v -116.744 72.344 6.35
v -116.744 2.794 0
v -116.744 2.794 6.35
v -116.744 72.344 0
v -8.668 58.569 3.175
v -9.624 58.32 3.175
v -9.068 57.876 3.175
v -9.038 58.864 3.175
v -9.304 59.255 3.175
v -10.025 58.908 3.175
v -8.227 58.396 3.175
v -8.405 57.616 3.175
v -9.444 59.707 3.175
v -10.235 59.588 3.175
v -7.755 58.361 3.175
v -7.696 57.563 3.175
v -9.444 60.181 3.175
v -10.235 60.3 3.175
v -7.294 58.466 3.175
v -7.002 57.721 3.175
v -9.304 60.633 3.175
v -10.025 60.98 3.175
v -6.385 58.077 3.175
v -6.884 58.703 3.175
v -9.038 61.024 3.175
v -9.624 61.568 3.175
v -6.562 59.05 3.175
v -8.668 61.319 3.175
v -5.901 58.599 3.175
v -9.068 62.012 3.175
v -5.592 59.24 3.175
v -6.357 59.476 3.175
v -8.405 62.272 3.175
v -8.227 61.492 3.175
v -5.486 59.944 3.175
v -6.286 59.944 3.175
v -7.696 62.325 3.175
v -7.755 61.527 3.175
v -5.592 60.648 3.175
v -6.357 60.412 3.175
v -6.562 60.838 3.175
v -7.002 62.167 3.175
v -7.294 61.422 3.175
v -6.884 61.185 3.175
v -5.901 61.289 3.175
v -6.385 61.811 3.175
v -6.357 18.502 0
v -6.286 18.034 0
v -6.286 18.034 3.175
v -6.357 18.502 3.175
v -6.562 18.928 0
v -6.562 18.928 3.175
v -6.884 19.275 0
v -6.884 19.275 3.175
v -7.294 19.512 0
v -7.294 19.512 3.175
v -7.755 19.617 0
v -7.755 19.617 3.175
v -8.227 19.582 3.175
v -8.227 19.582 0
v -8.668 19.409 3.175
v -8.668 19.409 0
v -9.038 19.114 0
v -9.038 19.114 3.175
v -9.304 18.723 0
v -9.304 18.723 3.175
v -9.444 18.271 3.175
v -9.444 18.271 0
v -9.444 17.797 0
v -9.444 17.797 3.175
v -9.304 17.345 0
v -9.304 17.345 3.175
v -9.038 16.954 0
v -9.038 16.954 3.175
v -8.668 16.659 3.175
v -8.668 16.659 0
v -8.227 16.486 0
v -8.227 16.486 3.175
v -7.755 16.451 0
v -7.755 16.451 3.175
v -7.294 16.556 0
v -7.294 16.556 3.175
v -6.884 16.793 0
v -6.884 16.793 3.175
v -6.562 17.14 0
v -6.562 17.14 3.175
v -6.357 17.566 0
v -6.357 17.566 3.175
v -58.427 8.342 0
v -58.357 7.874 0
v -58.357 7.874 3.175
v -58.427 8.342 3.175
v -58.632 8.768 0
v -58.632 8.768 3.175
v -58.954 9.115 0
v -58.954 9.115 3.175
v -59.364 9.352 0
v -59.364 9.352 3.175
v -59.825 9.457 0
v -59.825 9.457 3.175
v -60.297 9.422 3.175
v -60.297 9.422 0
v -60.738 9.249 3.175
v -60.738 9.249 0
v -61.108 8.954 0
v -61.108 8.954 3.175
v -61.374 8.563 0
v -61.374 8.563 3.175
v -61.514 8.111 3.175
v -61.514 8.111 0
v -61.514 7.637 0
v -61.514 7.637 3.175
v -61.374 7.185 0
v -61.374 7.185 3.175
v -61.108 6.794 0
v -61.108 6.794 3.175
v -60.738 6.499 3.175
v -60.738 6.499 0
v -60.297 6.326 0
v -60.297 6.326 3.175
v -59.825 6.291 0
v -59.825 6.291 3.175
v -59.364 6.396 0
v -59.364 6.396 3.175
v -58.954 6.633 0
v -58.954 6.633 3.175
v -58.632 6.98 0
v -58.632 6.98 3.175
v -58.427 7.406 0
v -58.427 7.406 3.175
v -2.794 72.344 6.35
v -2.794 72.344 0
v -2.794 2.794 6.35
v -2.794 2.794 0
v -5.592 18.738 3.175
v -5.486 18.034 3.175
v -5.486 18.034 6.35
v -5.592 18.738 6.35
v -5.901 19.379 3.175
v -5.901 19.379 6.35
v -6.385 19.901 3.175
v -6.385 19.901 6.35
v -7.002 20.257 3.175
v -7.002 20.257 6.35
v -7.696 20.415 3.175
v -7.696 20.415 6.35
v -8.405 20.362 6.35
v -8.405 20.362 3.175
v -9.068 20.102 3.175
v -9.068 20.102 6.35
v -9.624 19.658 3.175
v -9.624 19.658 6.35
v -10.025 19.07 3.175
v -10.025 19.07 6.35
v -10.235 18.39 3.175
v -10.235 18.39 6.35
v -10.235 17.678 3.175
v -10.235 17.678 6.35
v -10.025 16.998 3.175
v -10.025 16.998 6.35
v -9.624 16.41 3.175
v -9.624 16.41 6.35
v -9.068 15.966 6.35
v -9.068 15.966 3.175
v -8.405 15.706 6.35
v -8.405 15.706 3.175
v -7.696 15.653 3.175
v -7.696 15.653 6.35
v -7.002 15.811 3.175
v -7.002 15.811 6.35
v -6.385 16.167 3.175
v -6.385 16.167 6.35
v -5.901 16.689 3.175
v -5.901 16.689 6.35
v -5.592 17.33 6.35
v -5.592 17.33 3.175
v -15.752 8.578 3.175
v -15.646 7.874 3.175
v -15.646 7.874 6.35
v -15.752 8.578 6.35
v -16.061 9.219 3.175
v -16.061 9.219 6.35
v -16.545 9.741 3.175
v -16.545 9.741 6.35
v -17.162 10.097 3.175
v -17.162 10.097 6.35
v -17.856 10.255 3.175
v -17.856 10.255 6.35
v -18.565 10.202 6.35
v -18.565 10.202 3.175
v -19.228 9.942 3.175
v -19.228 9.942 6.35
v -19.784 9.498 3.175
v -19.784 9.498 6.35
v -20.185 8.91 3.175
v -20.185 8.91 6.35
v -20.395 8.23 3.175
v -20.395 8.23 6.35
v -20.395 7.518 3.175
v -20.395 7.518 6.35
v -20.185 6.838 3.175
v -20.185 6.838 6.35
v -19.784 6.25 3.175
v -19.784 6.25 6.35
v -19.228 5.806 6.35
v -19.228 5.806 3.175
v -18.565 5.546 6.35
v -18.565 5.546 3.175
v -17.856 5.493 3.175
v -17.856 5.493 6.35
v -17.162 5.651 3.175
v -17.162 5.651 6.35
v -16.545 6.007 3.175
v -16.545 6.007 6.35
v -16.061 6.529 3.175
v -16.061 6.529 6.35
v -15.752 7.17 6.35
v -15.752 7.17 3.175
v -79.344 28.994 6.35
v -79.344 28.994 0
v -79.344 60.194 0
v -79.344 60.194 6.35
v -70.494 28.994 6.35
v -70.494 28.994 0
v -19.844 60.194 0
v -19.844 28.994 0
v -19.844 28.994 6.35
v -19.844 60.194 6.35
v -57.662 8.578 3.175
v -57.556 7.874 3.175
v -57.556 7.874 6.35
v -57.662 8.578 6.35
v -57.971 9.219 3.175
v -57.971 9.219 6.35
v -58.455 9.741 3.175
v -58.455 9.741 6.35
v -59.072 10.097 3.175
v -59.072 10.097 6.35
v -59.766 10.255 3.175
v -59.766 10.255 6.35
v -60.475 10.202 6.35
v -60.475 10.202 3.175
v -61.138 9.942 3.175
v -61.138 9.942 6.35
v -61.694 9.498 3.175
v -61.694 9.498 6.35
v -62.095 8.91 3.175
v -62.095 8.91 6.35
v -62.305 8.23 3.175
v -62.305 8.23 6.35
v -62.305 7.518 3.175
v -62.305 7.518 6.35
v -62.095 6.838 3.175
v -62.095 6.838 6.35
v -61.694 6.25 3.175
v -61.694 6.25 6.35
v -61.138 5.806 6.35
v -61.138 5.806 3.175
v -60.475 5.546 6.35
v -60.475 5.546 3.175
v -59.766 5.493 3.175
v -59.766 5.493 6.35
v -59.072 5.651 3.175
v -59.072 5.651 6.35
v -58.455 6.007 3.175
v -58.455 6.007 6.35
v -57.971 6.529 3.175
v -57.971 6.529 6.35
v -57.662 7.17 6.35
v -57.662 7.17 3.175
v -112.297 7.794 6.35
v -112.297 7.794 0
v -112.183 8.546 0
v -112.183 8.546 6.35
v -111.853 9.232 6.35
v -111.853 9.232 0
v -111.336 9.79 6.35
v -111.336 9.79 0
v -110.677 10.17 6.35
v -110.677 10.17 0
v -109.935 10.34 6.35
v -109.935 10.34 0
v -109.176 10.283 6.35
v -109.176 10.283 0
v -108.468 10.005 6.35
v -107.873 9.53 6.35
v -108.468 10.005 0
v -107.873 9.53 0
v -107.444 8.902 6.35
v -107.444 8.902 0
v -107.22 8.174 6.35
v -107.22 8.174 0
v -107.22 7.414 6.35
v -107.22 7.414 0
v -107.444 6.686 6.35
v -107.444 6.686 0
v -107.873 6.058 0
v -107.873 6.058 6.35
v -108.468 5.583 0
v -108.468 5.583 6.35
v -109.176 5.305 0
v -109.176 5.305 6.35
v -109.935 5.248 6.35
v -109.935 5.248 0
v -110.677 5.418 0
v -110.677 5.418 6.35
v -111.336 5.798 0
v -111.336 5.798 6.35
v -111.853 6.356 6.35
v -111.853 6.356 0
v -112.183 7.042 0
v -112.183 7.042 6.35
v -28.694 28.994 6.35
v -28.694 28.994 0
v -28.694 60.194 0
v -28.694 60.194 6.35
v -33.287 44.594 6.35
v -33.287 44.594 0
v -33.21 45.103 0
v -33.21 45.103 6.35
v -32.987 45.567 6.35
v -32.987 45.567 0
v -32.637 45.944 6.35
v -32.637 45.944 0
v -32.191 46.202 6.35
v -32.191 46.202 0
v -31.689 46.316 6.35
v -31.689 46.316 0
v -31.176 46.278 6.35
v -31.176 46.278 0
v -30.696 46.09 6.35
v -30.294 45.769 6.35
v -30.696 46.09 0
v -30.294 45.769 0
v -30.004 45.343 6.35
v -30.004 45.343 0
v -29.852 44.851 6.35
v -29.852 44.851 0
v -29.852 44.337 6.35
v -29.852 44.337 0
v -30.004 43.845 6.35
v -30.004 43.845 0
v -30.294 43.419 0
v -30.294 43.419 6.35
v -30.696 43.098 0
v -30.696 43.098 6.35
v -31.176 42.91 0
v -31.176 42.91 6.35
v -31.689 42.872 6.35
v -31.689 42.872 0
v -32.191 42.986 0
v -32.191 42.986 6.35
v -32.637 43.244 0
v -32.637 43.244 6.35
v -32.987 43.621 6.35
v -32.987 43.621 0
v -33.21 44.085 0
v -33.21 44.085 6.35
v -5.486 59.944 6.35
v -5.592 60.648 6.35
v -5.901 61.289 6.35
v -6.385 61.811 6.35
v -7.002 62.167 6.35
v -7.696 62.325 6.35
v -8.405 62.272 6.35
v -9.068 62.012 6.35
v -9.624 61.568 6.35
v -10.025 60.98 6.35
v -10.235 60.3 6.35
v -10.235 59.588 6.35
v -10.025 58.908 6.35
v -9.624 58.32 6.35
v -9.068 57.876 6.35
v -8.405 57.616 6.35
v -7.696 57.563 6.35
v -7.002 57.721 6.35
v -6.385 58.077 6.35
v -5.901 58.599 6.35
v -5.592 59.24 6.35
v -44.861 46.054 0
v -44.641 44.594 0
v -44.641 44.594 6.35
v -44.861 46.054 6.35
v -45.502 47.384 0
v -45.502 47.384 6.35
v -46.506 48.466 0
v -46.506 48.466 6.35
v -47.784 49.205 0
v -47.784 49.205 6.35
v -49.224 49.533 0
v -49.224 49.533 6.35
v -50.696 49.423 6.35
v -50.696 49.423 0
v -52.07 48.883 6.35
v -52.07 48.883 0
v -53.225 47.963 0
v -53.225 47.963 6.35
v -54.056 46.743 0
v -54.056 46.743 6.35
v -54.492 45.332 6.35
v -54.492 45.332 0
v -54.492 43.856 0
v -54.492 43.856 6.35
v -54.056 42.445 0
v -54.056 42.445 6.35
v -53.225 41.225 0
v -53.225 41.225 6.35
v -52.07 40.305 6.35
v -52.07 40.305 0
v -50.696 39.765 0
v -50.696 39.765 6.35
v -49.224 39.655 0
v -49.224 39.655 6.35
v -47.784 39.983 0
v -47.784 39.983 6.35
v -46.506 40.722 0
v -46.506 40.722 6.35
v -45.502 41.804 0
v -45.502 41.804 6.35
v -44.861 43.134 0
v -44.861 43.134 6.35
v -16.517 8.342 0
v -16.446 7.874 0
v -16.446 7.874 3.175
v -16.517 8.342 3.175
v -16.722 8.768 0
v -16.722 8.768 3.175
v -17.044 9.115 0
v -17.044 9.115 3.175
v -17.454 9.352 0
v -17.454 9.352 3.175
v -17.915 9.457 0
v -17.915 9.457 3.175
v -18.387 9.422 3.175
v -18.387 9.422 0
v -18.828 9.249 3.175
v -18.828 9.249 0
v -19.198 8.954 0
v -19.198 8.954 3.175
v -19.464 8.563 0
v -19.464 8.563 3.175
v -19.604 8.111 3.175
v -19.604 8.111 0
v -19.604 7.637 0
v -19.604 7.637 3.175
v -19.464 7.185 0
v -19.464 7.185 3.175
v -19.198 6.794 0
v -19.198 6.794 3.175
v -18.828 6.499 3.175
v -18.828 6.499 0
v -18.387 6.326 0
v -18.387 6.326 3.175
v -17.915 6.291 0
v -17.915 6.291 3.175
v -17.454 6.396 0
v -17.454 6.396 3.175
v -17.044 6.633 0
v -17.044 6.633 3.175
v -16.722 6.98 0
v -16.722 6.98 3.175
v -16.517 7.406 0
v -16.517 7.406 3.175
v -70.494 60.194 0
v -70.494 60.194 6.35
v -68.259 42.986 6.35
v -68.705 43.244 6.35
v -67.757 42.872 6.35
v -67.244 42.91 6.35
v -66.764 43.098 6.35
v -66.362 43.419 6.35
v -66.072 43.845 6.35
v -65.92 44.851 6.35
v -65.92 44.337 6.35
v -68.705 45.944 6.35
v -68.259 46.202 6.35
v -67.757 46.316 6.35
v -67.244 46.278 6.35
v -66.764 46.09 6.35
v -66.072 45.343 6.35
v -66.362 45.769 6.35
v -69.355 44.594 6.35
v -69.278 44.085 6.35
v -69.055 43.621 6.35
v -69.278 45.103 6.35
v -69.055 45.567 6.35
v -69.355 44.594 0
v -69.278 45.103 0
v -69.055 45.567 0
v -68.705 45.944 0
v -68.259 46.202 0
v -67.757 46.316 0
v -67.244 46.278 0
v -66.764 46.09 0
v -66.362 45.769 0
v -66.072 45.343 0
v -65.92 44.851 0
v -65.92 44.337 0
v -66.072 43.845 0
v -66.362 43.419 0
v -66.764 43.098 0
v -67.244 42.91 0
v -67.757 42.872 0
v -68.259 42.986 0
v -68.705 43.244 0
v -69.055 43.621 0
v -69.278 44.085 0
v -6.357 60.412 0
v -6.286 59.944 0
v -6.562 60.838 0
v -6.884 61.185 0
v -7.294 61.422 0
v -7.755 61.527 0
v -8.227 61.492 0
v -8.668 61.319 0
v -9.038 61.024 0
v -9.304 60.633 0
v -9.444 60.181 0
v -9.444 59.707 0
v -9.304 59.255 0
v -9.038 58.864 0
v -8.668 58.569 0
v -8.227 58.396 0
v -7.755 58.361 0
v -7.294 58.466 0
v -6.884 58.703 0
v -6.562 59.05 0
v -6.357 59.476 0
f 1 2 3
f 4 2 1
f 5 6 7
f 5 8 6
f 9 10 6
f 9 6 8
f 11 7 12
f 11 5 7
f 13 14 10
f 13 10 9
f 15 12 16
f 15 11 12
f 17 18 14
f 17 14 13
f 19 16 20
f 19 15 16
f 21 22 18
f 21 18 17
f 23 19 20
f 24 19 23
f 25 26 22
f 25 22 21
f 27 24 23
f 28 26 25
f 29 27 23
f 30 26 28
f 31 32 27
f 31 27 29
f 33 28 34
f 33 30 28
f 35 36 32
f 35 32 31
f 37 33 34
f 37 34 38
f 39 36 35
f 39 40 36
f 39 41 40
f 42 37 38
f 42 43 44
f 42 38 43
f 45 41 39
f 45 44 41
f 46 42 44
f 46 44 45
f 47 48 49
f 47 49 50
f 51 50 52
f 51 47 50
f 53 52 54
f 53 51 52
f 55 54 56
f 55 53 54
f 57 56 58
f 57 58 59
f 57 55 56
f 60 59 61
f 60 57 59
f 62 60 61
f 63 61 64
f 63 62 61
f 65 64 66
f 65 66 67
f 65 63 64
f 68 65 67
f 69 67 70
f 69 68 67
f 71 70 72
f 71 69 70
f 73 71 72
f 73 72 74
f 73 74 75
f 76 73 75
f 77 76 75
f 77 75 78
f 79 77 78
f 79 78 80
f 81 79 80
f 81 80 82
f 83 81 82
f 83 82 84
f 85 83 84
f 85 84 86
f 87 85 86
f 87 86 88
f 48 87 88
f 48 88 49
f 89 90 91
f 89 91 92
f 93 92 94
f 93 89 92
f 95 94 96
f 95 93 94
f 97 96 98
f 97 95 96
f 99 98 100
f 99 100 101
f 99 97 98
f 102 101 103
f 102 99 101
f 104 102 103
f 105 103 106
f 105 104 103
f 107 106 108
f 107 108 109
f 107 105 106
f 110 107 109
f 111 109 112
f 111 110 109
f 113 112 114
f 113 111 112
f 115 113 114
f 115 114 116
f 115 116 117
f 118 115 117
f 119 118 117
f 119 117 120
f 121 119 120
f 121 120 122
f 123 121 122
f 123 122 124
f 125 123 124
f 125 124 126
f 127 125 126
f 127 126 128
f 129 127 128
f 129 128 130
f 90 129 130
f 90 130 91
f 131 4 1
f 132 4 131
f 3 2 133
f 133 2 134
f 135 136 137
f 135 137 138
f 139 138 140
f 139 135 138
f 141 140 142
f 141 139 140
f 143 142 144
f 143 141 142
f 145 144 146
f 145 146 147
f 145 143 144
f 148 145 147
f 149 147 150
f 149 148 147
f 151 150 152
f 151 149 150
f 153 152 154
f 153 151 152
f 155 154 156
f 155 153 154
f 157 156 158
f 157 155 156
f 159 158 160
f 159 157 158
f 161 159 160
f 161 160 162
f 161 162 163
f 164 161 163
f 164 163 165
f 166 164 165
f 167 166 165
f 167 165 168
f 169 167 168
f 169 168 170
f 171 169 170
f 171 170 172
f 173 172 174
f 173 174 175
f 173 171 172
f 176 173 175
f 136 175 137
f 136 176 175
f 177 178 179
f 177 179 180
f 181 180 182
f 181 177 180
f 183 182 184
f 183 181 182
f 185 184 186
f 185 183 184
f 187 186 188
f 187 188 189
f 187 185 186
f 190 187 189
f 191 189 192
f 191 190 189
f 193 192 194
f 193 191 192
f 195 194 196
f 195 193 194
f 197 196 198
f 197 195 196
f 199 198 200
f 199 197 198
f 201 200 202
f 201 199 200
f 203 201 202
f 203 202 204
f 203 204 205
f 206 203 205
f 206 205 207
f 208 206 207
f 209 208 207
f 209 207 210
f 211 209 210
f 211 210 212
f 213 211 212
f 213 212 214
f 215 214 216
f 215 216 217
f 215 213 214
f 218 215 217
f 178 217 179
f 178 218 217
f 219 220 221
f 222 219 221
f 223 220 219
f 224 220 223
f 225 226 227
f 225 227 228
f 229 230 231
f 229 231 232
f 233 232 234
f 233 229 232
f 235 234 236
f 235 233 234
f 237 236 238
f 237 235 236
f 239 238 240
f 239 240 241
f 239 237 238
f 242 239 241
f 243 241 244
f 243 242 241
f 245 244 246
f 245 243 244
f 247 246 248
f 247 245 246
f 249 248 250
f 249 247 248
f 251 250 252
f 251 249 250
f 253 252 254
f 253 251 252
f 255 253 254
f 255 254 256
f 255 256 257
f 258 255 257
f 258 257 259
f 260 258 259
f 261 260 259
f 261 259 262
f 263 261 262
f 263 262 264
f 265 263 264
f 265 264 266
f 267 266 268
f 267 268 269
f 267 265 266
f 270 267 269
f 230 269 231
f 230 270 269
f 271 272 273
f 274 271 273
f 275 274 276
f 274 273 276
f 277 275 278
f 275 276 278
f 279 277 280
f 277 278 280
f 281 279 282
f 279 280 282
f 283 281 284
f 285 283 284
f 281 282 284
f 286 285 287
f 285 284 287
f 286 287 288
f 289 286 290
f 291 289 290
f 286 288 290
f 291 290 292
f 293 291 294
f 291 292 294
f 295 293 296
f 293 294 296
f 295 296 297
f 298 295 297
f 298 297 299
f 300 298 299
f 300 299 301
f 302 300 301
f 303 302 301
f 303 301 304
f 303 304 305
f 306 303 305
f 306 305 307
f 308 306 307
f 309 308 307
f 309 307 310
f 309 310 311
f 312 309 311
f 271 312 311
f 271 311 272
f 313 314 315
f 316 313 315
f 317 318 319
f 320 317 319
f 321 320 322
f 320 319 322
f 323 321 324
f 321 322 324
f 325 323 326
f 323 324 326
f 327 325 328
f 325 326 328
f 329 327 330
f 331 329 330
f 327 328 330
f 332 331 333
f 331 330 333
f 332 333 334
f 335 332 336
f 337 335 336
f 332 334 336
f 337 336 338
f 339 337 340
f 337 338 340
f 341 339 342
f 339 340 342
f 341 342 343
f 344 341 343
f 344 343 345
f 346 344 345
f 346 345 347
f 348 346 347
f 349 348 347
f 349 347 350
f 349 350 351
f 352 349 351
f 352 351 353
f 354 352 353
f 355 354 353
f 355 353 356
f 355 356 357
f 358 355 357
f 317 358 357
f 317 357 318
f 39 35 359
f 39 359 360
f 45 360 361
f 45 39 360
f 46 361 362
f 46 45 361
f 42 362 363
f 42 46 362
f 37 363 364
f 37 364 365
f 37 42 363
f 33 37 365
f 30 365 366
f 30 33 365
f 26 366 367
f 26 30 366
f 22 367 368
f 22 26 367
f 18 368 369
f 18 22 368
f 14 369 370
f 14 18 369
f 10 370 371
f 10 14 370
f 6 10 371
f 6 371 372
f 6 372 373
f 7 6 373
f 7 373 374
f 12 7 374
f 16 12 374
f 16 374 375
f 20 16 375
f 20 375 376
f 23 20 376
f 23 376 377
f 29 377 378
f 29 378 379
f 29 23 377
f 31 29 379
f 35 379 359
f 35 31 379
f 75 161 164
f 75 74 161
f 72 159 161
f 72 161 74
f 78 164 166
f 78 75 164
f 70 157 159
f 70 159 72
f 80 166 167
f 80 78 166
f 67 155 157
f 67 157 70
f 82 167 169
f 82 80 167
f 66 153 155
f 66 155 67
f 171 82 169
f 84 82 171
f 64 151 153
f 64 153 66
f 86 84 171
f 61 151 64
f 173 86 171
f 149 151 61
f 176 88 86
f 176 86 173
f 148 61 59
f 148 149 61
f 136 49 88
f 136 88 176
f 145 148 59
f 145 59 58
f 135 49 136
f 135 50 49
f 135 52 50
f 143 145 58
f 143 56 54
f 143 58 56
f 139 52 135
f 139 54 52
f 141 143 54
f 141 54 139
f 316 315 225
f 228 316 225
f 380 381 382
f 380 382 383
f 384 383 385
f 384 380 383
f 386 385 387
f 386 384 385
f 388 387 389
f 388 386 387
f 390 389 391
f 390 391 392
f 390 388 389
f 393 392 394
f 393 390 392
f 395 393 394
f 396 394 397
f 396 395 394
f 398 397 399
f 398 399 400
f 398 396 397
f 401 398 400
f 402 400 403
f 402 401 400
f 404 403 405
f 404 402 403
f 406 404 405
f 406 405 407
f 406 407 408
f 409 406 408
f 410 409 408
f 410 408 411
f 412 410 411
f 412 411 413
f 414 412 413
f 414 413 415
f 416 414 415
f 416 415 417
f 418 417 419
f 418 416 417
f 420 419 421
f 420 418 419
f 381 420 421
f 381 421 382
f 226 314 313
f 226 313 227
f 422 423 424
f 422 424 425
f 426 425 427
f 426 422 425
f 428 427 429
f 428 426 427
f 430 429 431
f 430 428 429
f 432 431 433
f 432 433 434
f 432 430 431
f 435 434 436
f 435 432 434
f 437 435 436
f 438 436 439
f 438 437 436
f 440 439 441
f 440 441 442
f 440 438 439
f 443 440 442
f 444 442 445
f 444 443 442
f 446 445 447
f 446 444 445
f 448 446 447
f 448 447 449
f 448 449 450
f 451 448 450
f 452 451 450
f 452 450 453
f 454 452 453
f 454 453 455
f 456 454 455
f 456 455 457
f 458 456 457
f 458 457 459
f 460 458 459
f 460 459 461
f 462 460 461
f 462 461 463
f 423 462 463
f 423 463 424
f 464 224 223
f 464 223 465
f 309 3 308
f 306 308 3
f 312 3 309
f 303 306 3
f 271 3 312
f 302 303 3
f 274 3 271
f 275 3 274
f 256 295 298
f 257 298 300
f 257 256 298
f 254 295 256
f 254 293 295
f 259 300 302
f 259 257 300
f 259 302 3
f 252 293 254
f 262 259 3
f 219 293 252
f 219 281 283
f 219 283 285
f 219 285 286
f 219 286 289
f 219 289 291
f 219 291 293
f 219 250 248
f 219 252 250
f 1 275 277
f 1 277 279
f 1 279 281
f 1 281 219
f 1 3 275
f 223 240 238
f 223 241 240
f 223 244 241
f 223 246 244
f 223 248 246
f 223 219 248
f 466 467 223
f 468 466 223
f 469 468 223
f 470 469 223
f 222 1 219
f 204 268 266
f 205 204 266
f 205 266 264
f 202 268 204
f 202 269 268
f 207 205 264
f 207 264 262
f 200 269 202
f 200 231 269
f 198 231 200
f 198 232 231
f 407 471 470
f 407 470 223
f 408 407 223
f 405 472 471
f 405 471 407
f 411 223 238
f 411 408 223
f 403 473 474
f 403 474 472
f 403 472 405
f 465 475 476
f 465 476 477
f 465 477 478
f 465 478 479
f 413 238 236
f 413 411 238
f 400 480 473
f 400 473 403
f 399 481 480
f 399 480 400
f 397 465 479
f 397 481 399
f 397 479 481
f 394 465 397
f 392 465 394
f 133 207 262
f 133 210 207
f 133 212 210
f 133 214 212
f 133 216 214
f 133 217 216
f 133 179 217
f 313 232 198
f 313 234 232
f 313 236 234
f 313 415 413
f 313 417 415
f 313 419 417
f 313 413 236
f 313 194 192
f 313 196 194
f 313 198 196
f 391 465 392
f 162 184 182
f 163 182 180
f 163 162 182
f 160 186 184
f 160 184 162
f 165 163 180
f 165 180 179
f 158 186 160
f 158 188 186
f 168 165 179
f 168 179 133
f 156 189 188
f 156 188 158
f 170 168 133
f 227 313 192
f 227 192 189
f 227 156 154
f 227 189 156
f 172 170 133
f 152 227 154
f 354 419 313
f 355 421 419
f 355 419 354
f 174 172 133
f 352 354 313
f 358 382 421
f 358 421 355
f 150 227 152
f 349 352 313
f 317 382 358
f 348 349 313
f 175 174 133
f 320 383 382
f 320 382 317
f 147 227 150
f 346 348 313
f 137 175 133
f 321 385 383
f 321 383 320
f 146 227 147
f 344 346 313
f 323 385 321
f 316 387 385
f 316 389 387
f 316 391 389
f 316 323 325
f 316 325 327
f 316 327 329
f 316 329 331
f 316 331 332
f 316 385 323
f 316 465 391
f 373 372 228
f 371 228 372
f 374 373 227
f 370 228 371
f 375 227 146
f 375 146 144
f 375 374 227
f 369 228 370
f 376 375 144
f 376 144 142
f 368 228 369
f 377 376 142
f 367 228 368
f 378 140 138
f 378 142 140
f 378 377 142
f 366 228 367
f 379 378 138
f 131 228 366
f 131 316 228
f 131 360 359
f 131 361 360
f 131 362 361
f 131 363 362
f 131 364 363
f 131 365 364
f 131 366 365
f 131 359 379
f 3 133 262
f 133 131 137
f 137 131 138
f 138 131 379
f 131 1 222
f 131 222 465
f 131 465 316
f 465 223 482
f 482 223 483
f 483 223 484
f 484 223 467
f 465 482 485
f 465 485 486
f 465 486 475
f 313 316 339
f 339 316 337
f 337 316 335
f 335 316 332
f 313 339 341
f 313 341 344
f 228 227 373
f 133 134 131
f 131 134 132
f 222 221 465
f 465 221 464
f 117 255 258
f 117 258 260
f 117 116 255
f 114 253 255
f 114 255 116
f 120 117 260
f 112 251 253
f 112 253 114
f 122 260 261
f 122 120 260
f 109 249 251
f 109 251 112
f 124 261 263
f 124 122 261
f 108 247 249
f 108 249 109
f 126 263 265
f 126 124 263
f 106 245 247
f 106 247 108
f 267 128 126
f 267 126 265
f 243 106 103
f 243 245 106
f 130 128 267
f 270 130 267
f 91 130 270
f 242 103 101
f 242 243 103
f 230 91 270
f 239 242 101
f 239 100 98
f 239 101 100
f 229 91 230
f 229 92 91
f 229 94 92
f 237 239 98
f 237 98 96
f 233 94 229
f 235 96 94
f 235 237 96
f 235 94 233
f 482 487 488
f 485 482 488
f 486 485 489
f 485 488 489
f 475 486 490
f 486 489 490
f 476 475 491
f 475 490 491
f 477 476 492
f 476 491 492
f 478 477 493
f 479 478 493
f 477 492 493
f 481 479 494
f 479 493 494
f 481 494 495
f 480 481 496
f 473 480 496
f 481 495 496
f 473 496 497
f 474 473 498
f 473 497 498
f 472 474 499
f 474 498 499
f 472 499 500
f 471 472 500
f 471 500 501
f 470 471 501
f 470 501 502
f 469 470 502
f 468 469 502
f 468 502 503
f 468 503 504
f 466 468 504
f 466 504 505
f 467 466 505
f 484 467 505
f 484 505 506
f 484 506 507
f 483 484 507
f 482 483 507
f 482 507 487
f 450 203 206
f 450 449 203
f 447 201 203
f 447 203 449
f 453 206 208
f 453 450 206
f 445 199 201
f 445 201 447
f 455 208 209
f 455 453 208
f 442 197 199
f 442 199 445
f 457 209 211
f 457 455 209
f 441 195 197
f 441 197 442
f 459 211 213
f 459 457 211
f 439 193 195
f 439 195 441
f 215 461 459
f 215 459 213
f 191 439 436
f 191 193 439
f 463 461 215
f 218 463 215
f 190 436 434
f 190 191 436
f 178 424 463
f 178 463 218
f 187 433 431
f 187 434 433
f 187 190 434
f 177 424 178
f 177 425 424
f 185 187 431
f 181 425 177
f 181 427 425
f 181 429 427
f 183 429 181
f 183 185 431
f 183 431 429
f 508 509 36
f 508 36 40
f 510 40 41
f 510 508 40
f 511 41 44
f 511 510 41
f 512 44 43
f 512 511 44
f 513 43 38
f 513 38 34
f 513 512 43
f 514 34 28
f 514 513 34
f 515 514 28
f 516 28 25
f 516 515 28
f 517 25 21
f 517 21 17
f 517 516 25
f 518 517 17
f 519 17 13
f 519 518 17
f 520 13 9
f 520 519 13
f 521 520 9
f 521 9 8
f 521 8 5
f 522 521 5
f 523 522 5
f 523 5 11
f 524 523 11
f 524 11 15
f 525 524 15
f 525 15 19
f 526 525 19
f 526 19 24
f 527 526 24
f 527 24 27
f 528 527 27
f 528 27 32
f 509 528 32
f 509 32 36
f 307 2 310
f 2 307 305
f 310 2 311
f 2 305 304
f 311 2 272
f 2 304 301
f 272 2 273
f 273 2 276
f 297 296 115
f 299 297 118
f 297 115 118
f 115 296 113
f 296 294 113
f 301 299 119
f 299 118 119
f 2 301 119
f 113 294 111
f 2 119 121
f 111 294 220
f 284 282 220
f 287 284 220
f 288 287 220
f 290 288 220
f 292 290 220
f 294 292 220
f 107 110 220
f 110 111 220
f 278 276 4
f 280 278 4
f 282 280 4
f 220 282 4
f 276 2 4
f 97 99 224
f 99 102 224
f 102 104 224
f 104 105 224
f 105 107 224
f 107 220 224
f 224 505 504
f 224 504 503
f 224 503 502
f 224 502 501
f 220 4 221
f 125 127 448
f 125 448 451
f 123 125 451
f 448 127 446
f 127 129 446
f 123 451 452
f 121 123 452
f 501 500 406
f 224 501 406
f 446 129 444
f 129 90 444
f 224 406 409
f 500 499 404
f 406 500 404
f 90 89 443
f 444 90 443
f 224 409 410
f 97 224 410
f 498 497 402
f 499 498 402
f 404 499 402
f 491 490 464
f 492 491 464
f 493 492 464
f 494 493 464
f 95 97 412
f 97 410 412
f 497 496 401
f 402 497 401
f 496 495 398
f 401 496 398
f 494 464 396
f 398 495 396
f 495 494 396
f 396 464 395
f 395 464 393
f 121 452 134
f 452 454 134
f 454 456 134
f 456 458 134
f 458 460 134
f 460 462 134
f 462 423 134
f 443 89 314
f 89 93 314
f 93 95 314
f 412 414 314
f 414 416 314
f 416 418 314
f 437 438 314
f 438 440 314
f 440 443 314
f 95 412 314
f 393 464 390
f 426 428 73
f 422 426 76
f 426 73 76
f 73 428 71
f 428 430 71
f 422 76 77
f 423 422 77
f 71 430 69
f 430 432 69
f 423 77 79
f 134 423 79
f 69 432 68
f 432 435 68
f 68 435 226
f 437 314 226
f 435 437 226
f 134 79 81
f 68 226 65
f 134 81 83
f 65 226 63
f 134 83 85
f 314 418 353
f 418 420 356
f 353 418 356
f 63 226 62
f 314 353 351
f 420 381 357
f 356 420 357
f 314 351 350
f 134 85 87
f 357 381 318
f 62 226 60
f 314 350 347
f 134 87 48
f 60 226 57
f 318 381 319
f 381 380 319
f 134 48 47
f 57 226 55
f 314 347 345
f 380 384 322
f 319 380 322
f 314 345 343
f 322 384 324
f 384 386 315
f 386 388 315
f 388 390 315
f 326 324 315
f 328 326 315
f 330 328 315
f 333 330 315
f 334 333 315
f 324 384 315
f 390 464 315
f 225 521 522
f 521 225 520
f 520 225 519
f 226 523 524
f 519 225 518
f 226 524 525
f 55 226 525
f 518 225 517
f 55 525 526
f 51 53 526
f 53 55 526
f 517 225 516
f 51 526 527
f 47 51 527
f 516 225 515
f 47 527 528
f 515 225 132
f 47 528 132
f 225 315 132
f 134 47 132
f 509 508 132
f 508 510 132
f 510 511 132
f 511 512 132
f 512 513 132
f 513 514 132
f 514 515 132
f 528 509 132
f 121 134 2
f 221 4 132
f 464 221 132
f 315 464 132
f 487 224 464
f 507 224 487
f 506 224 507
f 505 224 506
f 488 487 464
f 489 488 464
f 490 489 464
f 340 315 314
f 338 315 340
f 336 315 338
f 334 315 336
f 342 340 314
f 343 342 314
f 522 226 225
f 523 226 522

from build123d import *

# Parameters (mm, degrees)
SKETCH5_W               = 88.55
SKETCH5_H               = 69.55
SKETCH5_R               = 2.3876
SKETCH5_R_2             = 3.683
SKETCH5_R_3             = 4.953
SKETCH5_W_2             = 8.85
SKETCH5_H_2             = 31.2
SKETCH5_R_4             = 1.5875
BOSS_EXTRUDE1_DEPTH     = 6.35
F_8_32_TAPPED_HOLE1_D   = 3.4544
CUT_EXTRUDE2_START      = 3.175
SKETCH5_3_R             = 2.3876
SKETCH5_3_R_2           = 1.5875
CUT_EXTRUDE2_DEPTH      = 3.175
SKETCH8_W               = 25.4
SKETCH8_H               = 69.55
SKETCH8_R               = 1
BOSS_EXTRUDE2_DEPTH     = 6.35
F_1_4_20_TAPPED_HOLE2_D = 5.1054


with BuildPart() as part:
    # Sketch5 → Boss-Extrude1 (new body)
    # profile 1 of 6: a face of its own
    with BuildSketch(Plane.XY):
        with Locations((-47.069, 37.569)):
            Rectangle(SKETCH5_W, SKETCH5_H)
        with Locations((-7.874, 18.034)):
            Circle(SKETCH5_R, mode=Mode.SUBTRACT)
        with Locations((-7.874, 59.944)):
            Circle(SKETCH5_R, mode=Mode.SUBTRACT)
        with Locations((-18.034, 7.874)):
            Circle(SKETCH5_R, mode=Mode.SUBTRACT)
        with Locations((-59.944, 7.874)):
            Circle(SKETCH5_R, mode=Mode.SUBTRACT)
        with Locations((-19.9136, 19.9136)):
            Circle(SKETCH5_R_2, mode=Mode.SUBTRACT)
        with Locations((-49.594, 44.594)):
            Circle(SKETCH5_R_3, mode=Mode.SUBTRACT)
        with Locations((-74.919, 44.594)):
            Rectangle(SKETCH5_W_2, SKETCH5_H_2, mode=Mode.SUBTRACT)
        with Locations((-24.269, 44.594)):
            Rectangle(SKETCH5_W_2, SKETCH5_H_2, mode=Mode.SUBTRACT)
    # profile 2 of 6: a face of its own
    with BuildSketch(Plane.XY):
        with Locations((-7.874, 59.944)):
            Circle(SKETCH5_R)
        with Locations((-7.874, 59.944)):
            Circle(SKETCH5_R_4, mode=Mode.SUBTRACT)
    # profile 3 of 6: a face of its own
    with BuildSketch(Plane.XY):
        with Locations((-19.9136, 19.9136)):
            Circle(SKETCH5_R_2)
    # profile 4 of 6: a face of its own
    with BuildSketch(Plane.XY):
        with Locations((-7.874, 18.034)):
            Circle(SKETCH5_R)
        with Locations((-7.874, 18.034)):
            Circle(SKETCH5_R_4, mode=Mode.SUBTRACT)
    # profile 5 of 6: a face of its own
    with BuildSketch(Plane.XY):
        with Locations((-18.034, 7.874)):
            Circle(SKETCH5_R)
        with Locations((-18.034, 7.874)):
            Circle(SKETCH5_R_4, mode=Mode.SUBTRACT)
    # profile 6 of 6: a face of its own
    with BuildSketch(Plane.XY):
        with Locations((-59.944, 7.874)):
            Circle(SKETCH5_R)
        with Locations((-59.944, 7.874)):
            Circle(SKETCH5_R_4, mode=Mode.SUBTRACT)
    extrude(amount=BOSS_EXTRUDE1_DEPTH)

    # #8-32 Tapped Hole1 (through all)
    with Locations(Plane(origin=(-67.628, 44.594, 6.35), x_dir=(1, 0, 0), z_dir=(0, 0, 1))):
        with Locations((0, 0), (36.068, 0)):
            Hole(F_8_32_TAPPED_HOLE1_D / 2)

    # Sketch5<3> → Cut-Extrude2 (cut)
    # profile 1 of 4: a face of its own
    with BuildSketch(Plane.XY.offset(CUT_EXTRUDE2_START)):
        with Locations((-18.034, 7.874)):
            Circle(SKETCH5_3_R)
        with Locations((-18.034, 7.874)):
            Circle(SKETCH5_3_R_2, mode=Mode.SUBTRACT)
    # profile 2 of 4: a face of its own
    with BuildSketch(Plane.XY.offset(CUT_EXTRUDE2_START)):
        with Locations((-7.874, 18.034)):
            Circle(SKETCH5_3_R)
        with Locations((-7.874, 18.034)):
            Circle(SKETCH5_3_R_2, mode=Mode.SUBTRACT)
    # profile 3 of 4: a face of its own
    with BuildSketch(Plane.XY.offset(CUT_EXTRUDE2_START)):
        with Locations((-59.944, 7.874)):
            Circle(SKETCH5_3_R)
        with Locations((-59.944, 7.874)):
            Circle(SKETCH5_3_R_2, mode=Mode.SUBTRACT)
    # profile 4 of 4: a face of its own
    with BuildSketch(Plane.XY.offset(CUT_EXTRUDE2_START)):
        with Locations((-7.874, 59.944)):
            Circle(SKETCH5_3_R)
        with Locations((-7.874, 59.944)):
            Circle(SKETCH5_3_R_2, mode=Mode.SUBTRACT)
    extrude(amount=CUT_EXTRUDE2_DEPTH, mode=Mode.SUBTRACT)

    # Sketch8 → Boss-Extrude2 (add)
    with BuildSketch(Plane.XY):
        with Locations((-104.044, 37.569)):
            Rectangle(SKETCH8_W, SKETCH8_H)
        with Locations((-109.744, 7.794)):
            Circle(SKETCH8_R, mode=Mode.SUBTRACT)
    extrude(amount=BOSS_EXTRUDE2_DEPTH)

    # 1/4-20 Tapped Hole2 (through all)
    with Locations(Plane(origin=(-109.744, 7.794, 6.35), x_dir=(1, 0, 0), z_dir=(0, 0, 1))):
        with Locations((0, 0)):
            Hole(F_1_4_20_TAPPED_HOLE2_D / 2)


solid = part.part
